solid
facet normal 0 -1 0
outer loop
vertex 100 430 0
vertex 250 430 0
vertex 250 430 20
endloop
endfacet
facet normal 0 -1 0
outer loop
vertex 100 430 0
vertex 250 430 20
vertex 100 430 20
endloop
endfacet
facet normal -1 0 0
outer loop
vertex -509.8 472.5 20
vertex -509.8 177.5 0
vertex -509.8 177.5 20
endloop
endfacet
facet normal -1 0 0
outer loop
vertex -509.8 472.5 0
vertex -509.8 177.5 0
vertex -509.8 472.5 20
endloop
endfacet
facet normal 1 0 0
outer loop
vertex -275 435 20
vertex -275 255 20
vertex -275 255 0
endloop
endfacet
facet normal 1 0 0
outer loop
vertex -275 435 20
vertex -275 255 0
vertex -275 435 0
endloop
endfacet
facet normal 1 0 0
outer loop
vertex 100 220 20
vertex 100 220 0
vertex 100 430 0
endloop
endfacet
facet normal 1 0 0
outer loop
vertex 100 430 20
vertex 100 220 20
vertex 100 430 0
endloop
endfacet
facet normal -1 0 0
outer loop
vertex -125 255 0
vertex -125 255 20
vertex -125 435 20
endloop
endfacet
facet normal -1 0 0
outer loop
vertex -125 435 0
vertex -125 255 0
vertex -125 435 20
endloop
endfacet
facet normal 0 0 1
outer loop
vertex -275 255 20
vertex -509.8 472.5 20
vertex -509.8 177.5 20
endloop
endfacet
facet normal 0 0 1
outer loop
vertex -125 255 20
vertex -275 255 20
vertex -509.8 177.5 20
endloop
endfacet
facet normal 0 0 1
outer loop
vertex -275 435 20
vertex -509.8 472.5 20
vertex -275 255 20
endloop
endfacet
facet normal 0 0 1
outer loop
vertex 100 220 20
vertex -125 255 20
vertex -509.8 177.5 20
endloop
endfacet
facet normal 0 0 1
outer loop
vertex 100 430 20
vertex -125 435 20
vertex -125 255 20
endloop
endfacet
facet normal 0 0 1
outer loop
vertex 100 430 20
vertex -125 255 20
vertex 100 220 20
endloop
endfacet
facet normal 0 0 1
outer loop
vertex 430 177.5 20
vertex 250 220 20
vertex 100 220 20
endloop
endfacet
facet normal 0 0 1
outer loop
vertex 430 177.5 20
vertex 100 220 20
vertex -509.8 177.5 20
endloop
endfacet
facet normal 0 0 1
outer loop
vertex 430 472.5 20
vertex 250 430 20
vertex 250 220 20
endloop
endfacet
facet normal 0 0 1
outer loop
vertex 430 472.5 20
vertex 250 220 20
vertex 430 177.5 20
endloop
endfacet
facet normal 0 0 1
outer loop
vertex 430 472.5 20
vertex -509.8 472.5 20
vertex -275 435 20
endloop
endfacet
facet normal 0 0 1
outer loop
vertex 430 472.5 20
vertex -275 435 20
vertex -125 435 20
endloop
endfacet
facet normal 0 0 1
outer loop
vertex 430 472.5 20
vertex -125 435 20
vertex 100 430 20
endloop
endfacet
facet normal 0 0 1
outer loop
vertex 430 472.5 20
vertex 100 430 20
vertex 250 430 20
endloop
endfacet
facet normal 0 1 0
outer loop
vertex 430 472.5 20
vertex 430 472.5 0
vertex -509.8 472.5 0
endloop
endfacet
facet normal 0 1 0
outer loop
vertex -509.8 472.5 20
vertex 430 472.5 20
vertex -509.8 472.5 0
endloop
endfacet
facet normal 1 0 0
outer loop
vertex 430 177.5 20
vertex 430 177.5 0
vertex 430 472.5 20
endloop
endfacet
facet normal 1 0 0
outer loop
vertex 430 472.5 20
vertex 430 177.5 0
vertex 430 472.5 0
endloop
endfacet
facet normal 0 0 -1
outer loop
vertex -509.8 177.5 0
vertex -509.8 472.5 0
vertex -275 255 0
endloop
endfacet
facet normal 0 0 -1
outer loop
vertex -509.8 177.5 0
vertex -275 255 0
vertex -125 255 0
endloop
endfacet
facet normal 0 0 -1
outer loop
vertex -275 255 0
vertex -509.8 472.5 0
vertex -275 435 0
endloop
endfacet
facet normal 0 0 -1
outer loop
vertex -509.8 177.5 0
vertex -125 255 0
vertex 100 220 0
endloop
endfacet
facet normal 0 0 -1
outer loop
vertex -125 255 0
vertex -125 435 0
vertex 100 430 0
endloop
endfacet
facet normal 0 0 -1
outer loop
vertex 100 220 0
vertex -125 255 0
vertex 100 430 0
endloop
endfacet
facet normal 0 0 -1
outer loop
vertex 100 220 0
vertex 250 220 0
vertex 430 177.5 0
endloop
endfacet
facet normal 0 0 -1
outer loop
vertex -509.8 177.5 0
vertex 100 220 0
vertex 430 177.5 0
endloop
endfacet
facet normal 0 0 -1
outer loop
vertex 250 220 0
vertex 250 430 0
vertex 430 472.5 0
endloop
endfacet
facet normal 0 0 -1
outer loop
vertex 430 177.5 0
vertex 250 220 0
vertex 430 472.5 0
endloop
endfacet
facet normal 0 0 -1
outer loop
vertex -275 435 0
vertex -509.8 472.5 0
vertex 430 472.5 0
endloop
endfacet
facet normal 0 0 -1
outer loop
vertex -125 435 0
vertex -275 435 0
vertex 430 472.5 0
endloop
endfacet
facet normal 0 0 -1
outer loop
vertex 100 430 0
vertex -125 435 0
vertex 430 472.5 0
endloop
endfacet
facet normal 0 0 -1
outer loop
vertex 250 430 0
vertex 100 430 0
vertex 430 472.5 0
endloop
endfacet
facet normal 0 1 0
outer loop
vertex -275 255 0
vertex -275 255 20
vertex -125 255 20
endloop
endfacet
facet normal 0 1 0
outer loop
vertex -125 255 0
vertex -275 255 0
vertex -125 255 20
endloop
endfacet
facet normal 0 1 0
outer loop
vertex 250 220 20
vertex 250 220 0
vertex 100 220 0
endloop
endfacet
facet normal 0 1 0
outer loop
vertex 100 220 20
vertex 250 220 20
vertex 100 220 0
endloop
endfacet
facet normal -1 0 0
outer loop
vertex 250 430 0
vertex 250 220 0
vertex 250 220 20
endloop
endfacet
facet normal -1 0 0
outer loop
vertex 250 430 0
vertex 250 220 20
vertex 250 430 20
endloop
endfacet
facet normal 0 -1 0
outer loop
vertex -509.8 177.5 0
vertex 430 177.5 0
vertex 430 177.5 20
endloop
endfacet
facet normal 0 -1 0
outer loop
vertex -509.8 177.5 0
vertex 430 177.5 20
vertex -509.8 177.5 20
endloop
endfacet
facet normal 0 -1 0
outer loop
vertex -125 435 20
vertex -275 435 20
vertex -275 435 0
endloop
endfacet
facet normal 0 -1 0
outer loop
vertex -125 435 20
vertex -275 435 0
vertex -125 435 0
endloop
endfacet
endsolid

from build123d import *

# Parameters (mm, degrees)
CROQUIS1_W              = 1200
CROQUIS1_H              = 950
SALIENTE_EXTRUIR1_DEPTH = 20
CROQUIS2_W              = 150
CROQUIS2_H              = 180
CORTAR_EXTRUIR1_DEPTH   = 20
CROQUIS3_W              = 650
CROQUIS3_H              = 500
CORTAR_EXTRUIR2_DEPTH   = 20
CORTAR_EXTRUIR4_DEPTH   = 50
CROQUIS7_W              = 150
CROQUIS7_H              = 210
CORTAR_EXTRUIR5_DEPTH   = 50
CROQUIS8_W              = 1514.751276537
CROQUIS8_H              = 489.569354176
CORTAR_EXTRUIR6_DEPTH   = 30
CROQUIS9_W              = 1728.554056326
CROQUIS9_H              = 479.757846805
CORTAR_EXTRUIR7_DEPTH   = 30
CROQUIS10_W             = 90.2
CROQUIS10_H             = 295
CROQUIS10_W_2           = 170
CORTAR_EXTRUIR8_DEPTH   = 30


with BuildPart() as part:
    # Croquis1 → Saliente-Extruir1 (new body)
    with BuildSketch(Plane.XY):
        Rectangle(CROQUIS1_W, CROQUIS1_H)
    extrude(amount=SALIENTE_EXTRUIR1_DEPTH)

    # Croquis2 → Cortar-Extruir1 (cut)
    with BuildSketch(Plane.XY.offset(20)):
        with Locations((-200, 345)):
            Rectangle(CROQUIS2_W, CROQUIS2_H)
    extrude(amount=-CORTAR_EXTRUIR1_DEPTH, mode=Mode.SUBTRACT)

    # Croquis3 → Cortar-Extruir2 (cut)
    with BuildSketch(Plane(origin=(0, 0, 0), x_dir=(-1, 0, 0), z_dir=(0, 0, -1))):
        with Locations((-50, -165)):
            Rectangle(CROQUIS3_W, CROQUIS3_H)
    extrude(amount=-CORTAR_EXTRUIR2_DEPTH, mode=Mode.SUBTRACT)

    # Croquis6 → Cortar-Extruir4 (cut)
    with BuildSketch(Plane(origin=(0, 0, 0), x_dir=(-1, 0, 0), z_dir=(0, 0, -1))):
        Polygon((600, 175), (-600, 175), (-633.284588691, 175), (-633.284588691, -516.156085413), (737.025481355, -516.156085413), (737.025481355, 175), align=None)
    extrude(amount=-CORTAR_EXTRUIR4_DEPTH, mode=Mode.SUBTRACT)

    # Croquis7 → Cortar-Extruir5 (cut)
    with BuildSketch(Plane(origin=(0, 0, 0), x_dir=(-1, 0, 0), z_dir=(0, 0, -1))):
        with Locations((-175, 325)):
            Rectangle(CROQUIS7_W, CROQUIS7_H)
    extrude(amount=-CORTAR_EXTRUIR5_DEPTH, mode=Mode.SUBTRACT)

    # Croquis8 → Cortar-Extruir6 (cut)
    with BuildSketch(Plane(origin=(0, 0, 0), x_dir=(-1, 0, 0), z_dir=(0, 0, -1))):
        with Locations((-63.357770541, 717.284677088)):
            Rectangle(CROQUIS8_W, CROQUIS8_H)
    extrude(amount=-CORTAR_EXTRUIR6_DEPTH, mode=Mode.SUBTRACT)

    # Croquis9 → Cortar-Extruir7 (cut)
    with BuildSketch(Plane(origin=(0, 0, 0), x_dir=(-1, 0, 0), z_dir=(0, 0, -1))):
        with Locations((-91.228936592, -62.378923403)):
            Rectangle(CROQUIS9_W, CROQUIS9_H)
    extrude(amount=-CORTAR_EXTRUIR7_DEPTH, mode=Mode.SUBTRACT)

    # Croquis10 → Cortar-Extruir8 (cut)
    with BuildSketch(Plane(origin=(0, 0, 0), x_dir=(-1, 0, 0), z_dir=(0, 0, -1))):
        with Locations((554.9, 325)):
            Rectangle(CROQUIS10_W, CROQUIS10_H)
        with Locations((-515, 325)):
            Rectangle(CROQUIS10_W_2, CROQUIS10_H)
    extrude(amount=-CORTAR_EXTRUIR8_DEPTH, mode=Mode.SUBTRACT)


solid = part.part
